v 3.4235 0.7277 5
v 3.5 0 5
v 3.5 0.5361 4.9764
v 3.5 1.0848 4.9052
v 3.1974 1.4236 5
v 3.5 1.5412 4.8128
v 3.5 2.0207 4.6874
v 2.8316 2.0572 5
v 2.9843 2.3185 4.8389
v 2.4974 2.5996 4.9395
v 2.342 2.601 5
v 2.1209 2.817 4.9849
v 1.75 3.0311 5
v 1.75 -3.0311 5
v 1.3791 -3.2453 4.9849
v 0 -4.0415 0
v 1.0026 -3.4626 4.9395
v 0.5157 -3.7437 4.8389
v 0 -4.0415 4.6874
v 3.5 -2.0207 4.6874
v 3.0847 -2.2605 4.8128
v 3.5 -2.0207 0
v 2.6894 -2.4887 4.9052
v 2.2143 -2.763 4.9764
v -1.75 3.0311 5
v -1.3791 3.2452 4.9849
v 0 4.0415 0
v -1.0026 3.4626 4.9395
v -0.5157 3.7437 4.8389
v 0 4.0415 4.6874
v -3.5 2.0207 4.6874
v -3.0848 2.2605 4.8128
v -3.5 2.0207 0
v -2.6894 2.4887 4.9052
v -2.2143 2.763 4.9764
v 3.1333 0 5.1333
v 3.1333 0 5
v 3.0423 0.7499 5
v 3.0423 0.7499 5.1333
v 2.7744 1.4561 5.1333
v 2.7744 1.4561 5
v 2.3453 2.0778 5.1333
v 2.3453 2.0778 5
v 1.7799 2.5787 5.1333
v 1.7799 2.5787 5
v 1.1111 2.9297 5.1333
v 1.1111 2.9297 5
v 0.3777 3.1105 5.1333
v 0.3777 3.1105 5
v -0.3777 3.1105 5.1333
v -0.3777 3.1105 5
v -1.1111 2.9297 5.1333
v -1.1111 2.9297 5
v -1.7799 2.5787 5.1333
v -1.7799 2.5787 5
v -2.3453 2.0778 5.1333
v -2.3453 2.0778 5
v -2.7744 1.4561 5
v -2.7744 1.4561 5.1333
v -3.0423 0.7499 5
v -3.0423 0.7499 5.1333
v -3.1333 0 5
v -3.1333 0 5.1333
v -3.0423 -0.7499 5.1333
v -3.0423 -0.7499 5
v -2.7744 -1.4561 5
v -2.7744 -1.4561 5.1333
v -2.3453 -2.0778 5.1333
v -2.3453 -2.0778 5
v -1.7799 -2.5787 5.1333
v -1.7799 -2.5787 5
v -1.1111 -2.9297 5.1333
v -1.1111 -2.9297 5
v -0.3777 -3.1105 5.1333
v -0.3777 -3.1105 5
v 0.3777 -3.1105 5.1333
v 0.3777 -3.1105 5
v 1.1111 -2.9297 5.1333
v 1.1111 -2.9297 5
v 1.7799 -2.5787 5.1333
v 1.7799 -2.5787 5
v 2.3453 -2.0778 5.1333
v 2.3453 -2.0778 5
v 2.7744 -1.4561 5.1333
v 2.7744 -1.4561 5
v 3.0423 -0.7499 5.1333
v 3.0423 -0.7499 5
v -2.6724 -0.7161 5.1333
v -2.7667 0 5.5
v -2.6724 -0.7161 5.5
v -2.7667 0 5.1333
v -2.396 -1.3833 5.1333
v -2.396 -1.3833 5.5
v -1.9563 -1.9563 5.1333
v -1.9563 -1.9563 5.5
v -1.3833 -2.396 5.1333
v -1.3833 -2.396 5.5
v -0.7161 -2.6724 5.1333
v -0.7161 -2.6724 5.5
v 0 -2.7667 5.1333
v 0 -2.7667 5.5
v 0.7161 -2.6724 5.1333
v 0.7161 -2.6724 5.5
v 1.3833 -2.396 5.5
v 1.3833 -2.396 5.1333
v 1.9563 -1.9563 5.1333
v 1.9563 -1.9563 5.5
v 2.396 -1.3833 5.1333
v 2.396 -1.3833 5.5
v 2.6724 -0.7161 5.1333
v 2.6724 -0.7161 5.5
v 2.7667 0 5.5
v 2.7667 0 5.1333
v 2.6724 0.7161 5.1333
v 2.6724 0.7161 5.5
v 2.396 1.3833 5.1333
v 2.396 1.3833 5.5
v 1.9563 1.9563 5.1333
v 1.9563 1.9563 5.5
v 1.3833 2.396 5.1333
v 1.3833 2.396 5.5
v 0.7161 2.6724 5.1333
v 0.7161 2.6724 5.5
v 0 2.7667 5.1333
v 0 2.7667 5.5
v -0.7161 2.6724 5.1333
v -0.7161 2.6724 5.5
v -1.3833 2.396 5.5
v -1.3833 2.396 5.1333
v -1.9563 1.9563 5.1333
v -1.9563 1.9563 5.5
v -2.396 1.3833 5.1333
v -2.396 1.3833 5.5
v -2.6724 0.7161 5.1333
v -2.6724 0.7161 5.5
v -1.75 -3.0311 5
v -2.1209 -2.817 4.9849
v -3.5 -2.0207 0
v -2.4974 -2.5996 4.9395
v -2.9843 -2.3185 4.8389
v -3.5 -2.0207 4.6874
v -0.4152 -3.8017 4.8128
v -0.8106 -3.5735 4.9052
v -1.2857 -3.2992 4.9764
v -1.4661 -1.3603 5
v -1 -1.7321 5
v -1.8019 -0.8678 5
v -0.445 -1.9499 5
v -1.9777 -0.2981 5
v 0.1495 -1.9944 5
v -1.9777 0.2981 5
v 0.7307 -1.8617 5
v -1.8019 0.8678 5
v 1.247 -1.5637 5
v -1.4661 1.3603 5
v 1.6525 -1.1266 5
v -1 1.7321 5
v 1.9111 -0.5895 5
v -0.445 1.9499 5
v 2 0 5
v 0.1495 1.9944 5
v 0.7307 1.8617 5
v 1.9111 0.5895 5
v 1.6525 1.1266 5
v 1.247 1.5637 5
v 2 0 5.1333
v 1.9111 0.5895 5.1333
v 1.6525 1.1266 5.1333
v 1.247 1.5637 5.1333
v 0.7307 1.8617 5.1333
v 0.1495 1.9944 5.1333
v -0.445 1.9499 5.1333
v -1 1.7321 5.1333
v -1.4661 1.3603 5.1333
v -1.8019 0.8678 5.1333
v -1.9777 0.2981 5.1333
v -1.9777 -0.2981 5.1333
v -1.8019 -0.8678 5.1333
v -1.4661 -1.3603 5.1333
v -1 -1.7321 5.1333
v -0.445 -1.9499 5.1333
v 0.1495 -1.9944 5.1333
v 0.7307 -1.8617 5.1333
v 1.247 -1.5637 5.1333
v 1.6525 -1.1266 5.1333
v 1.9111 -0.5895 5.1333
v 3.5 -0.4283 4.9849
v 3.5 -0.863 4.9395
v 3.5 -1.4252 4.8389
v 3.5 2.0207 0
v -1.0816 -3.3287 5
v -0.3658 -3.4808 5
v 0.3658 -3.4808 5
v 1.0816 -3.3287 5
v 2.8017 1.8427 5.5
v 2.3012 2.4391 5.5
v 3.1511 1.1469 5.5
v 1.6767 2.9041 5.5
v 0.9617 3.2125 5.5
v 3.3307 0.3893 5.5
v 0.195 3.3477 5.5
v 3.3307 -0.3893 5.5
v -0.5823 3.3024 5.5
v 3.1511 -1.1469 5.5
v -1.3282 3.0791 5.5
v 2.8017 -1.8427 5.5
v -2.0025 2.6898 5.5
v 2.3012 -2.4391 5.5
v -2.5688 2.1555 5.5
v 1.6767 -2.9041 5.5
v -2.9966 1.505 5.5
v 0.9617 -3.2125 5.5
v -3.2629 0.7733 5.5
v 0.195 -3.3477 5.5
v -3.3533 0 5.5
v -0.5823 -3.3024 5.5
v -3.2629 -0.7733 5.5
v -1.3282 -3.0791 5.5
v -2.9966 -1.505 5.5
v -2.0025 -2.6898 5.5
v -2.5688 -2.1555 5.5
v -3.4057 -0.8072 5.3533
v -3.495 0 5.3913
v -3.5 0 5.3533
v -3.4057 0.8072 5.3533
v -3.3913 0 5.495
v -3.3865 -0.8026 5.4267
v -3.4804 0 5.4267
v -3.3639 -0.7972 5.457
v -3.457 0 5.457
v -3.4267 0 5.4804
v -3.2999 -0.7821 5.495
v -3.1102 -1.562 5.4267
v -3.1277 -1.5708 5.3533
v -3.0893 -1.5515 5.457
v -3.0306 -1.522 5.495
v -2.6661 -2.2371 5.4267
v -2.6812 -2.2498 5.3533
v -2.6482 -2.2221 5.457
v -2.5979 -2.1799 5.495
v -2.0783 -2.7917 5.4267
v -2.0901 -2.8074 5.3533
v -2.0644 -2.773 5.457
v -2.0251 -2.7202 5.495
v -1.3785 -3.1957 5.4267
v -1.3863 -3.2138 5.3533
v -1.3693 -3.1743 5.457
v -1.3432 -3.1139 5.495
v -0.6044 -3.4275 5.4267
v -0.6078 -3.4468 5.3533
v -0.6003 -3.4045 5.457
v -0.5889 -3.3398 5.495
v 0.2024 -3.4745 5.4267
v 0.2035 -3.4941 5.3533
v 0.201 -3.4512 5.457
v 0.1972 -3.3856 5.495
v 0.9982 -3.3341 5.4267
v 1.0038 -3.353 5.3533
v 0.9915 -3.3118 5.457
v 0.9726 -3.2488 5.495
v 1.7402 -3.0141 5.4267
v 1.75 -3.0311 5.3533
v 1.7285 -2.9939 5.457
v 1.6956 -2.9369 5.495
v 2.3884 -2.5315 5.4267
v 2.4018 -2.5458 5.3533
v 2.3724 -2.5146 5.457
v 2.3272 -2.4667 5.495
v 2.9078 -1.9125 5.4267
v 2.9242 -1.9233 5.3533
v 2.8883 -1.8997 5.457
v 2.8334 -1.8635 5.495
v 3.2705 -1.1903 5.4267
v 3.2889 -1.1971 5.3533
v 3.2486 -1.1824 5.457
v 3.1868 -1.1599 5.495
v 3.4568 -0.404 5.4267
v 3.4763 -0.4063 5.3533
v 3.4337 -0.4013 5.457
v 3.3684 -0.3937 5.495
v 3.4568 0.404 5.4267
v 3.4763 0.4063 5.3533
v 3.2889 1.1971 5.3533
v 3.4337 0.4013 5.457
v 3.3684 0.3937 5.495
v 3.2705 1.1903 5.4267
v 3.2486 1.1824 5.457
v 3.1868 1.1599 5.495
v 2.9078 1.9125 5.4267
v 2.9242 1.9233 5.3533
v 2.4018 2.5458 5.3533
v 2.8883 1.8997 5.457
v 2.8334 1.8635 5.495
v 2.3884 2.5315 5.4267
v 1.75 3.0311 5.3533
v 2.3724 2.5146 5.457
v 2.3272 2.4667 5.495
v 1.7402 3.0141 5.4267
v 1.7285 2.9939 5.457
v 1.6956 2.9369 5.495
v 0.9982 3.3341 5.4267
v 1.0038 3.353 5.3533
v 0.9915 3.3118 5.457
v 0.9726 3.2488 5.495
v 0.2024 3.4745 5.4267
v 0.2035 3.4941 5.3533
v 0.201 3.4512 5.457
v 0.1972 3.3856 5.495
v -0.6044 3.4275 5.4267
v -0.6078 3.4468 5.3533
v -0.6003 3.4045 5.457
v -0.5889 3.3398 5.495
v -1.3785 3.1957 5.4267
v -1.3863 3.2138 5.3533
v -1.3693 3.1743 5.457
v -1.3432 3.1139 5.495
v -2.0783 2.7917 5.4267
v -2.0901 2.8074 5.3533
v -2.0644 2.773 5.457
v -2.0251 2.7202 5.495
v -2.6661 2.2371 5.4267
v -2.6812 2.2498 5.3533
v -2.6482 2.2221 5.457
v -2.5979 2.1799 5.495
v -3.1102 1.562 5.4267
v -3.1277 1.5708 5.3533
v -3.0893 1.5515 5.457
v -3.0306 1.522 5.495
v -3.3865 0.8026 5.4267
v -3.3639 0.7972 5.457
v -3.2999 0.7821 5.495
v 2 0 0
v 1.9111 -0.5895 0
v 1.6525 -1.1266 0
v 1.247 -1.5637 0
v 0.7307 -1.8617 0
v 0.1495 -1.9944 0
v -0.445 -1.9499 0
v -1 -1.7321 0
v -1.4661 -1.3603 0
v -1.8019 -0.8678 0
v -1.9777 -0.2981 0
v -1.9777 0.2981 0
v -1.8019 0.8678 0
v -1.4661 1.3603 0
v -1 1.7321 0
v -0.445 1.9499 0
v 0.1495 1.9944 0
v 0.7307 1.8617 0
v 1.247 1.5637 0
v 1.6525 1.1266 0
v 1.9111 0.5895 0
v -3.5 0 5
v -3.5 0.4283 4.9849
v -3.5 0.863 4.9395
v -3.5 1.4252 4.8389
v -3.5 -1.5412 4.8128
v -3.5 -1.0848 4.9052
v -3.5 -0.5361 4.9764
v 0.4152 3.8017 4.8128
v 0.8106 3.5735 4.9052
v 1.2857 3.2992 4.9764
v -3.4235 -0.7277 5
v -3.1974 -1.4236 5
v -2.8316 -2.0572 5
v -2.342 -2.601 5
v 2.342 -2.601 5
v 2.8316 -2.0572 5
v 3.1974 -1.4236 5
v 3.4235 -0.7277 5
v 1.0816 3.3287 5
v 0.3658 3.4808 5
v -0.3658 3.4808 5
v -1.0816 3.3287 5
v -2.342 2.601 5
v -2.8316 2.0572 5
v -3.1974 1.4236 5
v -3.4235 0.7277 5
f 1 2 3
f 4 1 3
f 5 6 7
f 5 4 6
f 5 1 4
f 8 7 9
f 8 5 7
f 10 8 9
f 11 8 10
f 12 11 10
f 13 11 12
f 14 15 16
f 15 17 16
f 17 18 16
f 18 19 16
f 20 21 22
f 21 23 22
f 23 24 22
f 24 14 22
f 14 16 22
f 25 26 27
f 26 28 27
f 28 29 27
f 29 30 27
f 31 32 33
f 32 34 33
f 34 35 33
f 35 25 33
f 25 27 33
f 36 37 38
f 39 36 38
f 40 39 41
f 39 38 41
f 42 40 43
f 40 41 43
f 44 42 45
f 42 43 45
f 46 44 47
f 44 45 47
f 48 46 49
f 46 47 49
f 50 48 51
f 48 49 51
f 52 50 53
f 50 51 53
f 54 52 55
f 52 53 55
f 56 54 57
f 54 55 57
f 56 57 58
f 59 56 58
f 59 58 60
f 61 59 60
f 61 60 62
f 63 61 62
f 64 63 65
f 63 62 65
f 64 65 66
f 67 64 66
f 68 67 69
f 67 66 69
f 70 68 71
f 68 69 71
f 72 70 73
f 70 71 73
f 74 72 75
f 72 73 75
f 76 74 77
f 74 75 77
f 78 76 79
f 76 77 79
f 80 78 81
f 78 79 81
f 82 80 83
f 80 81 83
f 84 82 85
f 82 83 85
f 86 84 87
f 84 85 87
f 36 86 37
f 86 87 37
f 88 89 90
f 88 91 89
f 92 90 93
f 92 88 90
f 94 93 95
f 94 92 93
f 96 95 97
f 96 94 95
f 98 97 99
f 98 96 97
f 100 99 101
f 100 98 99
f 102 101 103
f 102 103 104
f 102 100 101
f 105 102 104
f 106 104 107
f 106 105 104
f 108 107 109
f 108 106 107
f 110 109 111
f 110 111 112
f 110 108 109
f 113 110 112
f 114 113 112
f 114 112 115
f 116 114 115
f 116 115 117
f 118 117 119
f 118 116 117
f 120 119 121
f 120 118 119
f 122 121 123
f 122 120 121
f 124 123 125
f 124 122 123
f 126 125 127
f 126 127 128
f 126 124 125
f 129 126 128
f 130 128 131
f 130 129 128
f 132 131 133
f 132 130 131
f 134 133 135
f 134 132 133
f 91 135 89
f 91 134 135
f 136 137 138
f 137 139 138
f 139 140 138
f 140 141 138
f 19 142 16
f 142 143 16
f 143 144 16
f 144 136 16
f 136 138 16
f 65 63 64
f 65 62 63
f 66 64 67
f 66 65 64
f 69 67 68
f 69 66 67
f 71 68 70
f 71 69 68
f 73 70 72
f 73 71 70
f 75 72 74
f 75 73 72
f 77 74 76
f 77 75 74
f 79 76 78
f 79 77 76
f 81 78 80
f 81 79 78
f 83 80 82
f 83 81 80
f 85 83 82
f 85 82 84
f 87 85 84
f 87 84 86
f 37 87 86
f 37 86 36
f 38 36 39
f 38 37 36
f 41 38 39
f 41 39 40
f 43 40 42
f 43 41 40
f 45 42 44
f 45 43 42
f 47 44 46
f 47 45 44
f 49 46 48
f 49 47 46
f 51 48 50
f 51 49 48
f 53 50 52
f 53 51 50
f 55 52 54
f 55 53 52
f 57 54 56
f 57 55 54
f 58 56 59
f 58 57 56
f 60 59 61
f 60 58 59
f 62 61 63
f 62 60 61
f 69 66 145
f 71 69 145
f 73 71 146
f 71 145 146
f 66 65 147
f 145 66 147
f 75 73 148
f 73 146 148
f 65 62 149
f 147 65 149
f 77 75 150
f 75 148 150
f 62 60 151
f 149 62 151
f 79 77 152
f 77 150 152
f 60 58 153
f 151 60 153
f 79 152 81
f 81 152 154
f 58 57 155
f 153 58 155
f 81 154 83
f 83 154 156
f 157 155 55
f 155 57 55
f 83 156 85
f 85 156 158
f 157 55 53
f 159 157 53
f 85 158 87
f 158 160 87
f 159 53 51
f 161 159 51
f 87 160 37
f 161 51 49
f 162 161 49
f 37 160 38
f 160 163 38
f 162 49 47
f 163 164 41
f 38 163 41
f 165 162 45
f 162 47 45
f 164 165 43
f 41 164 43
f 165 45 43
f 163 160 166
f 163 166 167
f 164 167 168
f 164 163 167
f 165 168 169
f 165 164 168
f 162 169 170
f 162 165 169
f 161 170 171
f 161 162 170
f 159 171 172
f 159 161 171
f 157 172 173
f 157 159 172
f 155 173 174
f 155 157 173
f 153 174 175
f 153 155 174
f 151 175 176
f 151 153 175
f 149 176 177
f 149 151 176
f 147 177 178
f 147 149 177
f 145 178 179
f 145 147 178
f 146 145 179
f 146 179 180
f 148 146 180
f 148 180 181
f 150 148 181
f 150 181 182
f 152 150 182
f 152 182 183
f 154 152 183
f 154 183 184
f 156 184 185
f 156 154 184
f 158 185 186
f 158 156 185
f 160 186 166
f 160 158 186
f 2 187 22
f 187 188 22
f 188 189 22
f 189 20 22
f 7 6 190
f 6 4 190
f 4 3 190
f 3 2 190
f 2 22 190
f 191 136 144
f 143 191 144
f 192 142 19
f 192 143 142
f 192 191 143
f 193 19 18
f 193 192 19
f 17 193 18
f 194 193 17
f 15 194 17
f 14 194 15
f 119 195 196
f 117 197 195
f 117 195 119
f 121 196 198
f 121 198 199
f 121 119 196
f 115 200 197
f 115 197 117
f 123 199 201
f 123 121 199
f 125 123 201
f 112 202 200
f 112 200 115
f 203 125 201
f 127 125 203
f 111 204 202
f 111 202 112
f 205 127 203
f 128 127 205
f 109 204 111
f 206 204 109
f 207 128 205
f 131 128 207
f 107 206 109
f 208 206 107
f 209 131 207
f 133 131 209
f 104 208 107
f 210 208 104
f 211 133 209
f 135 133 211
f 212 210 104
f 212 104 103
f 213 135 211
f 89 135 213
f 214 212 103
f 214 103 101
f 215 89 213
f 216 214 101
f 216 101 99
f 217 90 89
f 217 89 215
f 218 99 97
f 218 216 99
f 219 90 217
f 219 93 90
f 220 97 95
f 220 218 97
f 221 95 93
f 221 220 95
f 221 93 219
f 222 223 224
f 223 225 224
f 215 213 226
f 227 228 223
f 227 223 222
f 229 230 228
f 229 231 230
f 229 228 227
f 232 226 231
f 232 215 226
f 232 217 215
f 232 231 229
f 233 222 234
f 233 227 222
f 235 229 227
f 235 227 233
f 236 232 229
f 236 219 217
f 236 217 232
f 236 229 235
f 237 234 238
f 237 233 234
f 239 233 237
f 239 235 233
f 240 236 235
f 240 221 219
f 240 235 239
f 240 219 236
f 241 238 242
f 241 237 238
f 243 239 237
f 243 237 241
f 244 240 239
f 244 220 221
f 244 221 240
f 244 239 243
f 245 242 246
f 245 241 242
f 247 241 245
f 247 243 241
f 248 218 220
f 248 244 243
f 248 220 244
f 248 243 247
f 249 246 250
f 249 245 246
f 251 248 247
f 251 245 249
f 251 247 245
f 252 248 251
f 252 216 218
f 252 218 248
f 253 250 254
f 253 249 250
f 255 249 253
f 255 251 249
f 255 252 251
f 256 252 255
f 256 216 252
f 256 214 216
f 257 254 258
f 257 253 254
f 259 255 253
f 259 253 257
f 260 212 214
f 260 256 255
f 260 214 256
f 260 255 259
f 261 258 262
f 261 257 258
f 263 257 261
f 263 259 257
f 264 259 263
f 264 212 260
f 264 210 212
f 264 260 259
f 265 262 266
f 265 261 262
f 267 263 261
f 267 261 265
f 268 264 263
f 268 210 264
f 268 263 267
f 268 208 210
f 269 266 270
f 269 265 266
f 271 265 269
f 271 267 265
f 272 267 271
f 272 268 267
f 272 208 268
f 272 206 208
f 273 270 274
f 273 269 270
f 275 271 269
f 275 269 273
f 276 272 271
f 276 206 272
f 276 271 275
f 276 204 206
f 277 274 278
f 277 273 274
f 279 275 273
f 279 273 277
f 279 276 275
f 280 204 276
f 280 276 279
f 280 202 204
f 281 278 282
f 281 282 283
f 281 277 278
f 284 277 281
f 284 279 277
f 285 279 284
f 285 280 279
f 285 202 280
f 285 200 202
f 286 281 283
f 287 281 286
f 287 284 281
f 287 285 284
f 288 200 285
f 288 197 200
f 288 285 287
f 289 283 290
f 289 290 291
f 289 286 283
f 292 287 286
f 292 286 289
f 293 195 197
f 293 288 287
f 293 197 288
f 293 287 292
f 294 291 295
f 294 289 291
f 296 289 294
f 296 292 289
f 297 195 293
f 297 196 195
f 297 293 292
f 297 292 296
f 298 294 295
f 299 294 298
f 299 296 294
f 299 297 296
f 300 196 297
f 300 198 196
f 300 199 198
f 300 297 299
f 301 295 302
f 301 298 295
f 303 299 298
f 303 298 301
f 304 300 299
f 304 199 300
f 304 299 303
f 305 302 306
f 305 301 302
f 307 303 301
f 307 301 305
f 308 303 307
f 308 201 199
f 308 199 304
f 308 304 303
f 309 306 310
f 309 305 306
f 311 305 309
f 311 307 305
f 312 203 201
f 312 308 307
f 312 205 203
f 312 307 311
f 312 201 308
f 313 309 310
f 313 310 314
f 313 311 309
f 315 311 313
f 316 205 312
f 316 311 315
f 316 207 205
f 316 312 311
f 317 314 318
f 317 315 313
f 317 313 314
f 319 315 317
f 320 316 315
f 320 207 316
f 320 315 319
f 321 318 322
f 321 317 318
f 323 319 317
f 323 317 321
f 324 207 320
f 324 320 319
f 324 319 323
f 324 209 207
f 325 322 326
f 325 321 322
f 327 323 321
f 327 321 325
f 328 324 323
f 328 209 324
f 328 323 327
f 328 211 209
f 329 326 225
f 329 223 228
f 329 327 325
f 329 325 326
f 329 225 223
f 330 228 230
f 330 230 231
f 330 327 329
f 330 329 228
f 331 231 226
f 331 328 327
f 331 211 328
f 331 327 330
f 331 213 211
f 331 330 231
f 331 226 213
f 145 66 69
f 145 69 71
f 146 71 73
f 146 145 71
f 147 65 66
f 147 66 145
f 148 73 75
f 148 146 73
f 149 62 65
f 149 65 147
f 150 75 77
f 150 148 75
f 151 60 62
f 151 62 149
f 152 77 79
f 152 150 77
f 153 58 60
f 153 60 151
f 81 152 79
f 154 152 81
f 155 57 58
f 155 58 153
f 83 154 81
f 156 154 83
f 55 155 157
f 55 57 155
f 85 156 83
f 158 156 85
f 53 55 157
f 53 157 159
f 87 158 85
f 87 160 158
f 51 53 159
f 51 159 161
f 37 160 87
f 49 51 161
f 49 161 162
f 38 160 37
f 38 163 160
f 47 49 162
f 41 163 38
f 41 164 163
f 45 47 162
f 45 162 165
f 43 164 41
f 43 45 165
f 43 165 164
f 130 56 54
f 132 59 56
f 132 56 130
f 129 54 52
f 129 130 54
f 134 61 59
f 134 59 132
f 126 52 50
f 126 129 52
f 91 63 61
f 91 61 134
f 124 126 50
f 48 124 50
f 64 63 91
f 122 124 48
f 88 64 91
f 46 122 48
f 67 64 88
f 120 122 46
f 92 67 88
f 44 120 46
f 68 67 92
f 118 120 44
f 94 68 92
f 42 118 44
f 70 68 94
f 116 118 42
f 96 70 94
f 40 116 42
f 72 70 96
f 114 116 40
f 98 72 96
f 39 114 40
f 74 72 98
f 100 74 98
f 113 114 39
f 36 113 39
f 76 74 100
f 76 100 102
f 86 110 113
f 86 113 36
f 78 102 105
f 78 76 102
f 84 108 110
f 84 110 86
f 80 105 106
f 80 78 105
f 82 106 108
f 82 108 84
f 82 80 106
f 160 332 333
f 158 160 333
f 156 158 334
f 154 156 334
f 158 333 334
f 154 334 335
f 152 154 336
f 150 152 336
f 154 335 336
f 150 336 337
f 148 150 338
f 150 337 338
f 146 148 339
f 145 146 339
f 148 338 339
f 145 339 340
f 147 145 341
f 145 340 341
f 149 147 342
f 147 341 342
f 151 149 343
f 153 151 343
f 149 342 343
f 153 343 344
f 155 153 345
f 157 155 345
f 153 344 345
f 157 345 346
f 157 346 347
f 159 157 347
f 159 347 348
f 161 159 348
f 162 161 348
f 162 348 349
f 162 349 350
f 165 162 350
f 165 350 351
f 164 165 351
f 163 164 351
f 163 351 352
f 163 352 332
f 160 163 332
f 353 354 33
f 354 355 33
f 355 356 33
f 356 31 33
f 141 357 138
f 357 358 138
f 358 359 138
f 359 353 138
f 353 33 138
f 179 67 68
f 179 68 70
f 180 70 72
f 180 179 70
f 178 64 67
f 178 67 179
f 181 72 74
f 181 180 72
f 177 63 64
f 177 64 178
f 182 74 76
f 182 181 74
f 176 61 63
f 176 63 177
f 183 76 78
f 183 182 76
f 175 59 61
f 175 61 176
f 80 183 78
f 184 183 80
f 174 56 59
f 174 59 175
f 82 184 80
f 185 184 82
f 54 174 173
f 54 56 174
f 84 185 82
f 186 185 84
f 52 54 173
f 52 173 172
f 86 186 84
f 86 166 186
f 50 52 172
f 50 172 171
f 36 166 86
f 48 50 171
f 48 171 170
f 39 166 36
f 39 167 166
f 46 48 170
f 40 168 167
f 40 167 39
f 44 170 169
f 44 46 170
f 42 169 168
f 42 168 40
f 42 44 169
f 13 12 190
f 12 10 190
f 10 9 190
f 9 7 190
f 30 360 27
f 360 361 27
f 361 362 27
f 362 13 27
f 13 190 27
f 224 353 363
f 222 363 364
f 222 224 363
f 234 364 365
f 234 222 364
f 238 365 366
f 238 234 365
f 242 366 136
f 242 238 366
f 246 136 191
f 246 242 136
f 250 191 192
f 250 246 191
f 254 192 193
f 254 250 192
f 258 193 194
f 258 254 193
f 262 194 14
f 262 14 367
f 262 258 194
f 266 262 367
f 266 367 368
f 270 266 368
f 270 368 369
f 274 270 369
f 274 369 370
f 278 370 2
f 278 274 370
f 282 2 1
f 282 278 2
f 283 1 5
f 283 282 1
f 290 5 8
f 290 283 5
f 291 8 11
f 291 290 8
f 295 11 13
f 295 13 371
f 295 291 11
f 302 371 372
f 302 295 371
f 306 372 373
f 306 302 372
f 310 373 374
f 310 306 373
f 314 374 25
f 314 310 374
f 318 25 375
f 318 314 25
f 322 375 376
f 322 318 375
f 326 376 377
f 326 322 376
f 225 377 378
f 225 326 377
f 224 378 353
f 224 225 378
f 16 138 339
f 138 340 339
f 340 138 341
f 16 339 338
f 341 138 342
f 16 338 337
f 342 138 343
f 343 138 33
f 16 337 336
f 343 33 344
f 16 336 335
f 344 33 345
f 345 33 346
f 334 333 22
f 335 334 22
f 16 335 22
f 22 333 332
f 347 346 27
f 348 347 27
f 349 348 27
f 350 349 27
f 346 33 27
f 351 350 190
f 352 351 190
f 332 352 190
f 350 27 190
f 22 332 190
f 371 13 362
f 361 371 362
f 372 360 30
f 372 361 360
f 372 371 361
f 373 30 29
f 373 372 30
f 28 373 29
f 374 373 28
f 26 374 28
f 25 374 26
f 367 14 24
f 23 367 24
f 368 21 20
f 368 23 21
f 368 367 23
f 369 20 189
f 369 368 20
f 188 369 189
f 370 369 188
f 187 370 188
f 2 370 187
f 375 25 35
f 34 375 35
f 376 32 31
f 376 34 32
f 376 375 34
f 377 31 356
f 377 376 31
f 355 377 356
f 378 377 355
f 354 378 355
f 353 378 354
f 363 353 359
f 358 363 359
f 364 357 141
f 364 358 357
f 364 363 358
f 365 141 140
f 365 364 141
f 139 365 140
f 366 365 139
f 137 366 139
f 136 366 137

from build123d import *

# Parameters (mm, degrees)
EXTRUDE1_DEPTH     = 5
SKETCH5_R          = 3.133333333
SKETCH5_R_2        = 2
EXTRUDE2_DEPTH     = 0.133333333
SKETCH4_R          = 2
CUT_EXTRUDE1_DEPTH = 8.670288999
FILLET2_R          = 0.146666667


with BuildPart() as part:
    # Sketch1 → Extrude1 (new body)
    with BuildSketch(Plane.XY):
        Polygon((0, 4.041451884), (-3.5, 2.020725942), (-3.5, -2.020725942), (0, -4.041451884), (3.5, -2.020725942), (3.5, 2.020725942), align=None)
    extrude(amount=EXTRUDE1_DEPTH)

    # Sketch2 → Cut-Revolve1 (revolve, cut)
    with BuildSketch(Plane(origin=(0, 0, 0), x_dir=(1, 0, 0), z_dir=(0, 1, 0))):
        Polygon((3.5, -5), (4.9, -5), (4.9, -4.191709623), align=None)
    revolve(axis=Axis((0, 0, 0), (0, 0, 1)), mode=Mode.SUBTRACT)

    # Sketch3 → Revolve1 (revolve)
    with BuildSketch(Plane(origin=(0, 0, 0), x_dir=(1, 0, 0), z_dir=(0, 1, 0)), mode=Mode.PRIVATE) as revolve1_sk:
        Polygon((3.5, -5), (3.5, -5.5), (2.766666667, -5.5), (2.766666667, -5.133333333), (3.133333333, -5.133333333), (3.133333333, -5), align=None)
    revolve(revolve1_sk.sketch.rotate(Axis((0, 0, 0), (0, 0, 1)), 180), axis=Axis((0, 0, 0), (0, 0, 1)))

    # Sketch4 → Cut-Extrude1 (cut, through all)
    with BuildSketch(Plane(origin=(0, 0, 0), x_dir=(-1, 0, 0), z_dir=(0, 0, -1))):
        with Locations(Location((0, 0, 0), (0, 0, 180))):
            Circle(SKETCH4_R)
    extrude(amount=-CUT_EXTRUDE1_DEPTH, mode=Mode.SUBTRACT)

    # Fillet2
    fillet2_edges = [part.edges().sort_by_distance(p)[0] for p in [
        (3.5, 0, 5.5),
    ]]
    fillet(fillet2_edges, radius=FILLET2_R)


with BuildPart() as body_2:
    # Sketch5 → Extrude2 (new body)
    with BuildSketch(Plane.XY.offset(5)):
        Circle(SKETCH5_R)
        Circle(SKETCH5_R_2, mode=Mode.SUBTRACT)
    extrude(amount=EXTRUDE2_DEPTH)


solid = Compound([part.part, body_2.part])
